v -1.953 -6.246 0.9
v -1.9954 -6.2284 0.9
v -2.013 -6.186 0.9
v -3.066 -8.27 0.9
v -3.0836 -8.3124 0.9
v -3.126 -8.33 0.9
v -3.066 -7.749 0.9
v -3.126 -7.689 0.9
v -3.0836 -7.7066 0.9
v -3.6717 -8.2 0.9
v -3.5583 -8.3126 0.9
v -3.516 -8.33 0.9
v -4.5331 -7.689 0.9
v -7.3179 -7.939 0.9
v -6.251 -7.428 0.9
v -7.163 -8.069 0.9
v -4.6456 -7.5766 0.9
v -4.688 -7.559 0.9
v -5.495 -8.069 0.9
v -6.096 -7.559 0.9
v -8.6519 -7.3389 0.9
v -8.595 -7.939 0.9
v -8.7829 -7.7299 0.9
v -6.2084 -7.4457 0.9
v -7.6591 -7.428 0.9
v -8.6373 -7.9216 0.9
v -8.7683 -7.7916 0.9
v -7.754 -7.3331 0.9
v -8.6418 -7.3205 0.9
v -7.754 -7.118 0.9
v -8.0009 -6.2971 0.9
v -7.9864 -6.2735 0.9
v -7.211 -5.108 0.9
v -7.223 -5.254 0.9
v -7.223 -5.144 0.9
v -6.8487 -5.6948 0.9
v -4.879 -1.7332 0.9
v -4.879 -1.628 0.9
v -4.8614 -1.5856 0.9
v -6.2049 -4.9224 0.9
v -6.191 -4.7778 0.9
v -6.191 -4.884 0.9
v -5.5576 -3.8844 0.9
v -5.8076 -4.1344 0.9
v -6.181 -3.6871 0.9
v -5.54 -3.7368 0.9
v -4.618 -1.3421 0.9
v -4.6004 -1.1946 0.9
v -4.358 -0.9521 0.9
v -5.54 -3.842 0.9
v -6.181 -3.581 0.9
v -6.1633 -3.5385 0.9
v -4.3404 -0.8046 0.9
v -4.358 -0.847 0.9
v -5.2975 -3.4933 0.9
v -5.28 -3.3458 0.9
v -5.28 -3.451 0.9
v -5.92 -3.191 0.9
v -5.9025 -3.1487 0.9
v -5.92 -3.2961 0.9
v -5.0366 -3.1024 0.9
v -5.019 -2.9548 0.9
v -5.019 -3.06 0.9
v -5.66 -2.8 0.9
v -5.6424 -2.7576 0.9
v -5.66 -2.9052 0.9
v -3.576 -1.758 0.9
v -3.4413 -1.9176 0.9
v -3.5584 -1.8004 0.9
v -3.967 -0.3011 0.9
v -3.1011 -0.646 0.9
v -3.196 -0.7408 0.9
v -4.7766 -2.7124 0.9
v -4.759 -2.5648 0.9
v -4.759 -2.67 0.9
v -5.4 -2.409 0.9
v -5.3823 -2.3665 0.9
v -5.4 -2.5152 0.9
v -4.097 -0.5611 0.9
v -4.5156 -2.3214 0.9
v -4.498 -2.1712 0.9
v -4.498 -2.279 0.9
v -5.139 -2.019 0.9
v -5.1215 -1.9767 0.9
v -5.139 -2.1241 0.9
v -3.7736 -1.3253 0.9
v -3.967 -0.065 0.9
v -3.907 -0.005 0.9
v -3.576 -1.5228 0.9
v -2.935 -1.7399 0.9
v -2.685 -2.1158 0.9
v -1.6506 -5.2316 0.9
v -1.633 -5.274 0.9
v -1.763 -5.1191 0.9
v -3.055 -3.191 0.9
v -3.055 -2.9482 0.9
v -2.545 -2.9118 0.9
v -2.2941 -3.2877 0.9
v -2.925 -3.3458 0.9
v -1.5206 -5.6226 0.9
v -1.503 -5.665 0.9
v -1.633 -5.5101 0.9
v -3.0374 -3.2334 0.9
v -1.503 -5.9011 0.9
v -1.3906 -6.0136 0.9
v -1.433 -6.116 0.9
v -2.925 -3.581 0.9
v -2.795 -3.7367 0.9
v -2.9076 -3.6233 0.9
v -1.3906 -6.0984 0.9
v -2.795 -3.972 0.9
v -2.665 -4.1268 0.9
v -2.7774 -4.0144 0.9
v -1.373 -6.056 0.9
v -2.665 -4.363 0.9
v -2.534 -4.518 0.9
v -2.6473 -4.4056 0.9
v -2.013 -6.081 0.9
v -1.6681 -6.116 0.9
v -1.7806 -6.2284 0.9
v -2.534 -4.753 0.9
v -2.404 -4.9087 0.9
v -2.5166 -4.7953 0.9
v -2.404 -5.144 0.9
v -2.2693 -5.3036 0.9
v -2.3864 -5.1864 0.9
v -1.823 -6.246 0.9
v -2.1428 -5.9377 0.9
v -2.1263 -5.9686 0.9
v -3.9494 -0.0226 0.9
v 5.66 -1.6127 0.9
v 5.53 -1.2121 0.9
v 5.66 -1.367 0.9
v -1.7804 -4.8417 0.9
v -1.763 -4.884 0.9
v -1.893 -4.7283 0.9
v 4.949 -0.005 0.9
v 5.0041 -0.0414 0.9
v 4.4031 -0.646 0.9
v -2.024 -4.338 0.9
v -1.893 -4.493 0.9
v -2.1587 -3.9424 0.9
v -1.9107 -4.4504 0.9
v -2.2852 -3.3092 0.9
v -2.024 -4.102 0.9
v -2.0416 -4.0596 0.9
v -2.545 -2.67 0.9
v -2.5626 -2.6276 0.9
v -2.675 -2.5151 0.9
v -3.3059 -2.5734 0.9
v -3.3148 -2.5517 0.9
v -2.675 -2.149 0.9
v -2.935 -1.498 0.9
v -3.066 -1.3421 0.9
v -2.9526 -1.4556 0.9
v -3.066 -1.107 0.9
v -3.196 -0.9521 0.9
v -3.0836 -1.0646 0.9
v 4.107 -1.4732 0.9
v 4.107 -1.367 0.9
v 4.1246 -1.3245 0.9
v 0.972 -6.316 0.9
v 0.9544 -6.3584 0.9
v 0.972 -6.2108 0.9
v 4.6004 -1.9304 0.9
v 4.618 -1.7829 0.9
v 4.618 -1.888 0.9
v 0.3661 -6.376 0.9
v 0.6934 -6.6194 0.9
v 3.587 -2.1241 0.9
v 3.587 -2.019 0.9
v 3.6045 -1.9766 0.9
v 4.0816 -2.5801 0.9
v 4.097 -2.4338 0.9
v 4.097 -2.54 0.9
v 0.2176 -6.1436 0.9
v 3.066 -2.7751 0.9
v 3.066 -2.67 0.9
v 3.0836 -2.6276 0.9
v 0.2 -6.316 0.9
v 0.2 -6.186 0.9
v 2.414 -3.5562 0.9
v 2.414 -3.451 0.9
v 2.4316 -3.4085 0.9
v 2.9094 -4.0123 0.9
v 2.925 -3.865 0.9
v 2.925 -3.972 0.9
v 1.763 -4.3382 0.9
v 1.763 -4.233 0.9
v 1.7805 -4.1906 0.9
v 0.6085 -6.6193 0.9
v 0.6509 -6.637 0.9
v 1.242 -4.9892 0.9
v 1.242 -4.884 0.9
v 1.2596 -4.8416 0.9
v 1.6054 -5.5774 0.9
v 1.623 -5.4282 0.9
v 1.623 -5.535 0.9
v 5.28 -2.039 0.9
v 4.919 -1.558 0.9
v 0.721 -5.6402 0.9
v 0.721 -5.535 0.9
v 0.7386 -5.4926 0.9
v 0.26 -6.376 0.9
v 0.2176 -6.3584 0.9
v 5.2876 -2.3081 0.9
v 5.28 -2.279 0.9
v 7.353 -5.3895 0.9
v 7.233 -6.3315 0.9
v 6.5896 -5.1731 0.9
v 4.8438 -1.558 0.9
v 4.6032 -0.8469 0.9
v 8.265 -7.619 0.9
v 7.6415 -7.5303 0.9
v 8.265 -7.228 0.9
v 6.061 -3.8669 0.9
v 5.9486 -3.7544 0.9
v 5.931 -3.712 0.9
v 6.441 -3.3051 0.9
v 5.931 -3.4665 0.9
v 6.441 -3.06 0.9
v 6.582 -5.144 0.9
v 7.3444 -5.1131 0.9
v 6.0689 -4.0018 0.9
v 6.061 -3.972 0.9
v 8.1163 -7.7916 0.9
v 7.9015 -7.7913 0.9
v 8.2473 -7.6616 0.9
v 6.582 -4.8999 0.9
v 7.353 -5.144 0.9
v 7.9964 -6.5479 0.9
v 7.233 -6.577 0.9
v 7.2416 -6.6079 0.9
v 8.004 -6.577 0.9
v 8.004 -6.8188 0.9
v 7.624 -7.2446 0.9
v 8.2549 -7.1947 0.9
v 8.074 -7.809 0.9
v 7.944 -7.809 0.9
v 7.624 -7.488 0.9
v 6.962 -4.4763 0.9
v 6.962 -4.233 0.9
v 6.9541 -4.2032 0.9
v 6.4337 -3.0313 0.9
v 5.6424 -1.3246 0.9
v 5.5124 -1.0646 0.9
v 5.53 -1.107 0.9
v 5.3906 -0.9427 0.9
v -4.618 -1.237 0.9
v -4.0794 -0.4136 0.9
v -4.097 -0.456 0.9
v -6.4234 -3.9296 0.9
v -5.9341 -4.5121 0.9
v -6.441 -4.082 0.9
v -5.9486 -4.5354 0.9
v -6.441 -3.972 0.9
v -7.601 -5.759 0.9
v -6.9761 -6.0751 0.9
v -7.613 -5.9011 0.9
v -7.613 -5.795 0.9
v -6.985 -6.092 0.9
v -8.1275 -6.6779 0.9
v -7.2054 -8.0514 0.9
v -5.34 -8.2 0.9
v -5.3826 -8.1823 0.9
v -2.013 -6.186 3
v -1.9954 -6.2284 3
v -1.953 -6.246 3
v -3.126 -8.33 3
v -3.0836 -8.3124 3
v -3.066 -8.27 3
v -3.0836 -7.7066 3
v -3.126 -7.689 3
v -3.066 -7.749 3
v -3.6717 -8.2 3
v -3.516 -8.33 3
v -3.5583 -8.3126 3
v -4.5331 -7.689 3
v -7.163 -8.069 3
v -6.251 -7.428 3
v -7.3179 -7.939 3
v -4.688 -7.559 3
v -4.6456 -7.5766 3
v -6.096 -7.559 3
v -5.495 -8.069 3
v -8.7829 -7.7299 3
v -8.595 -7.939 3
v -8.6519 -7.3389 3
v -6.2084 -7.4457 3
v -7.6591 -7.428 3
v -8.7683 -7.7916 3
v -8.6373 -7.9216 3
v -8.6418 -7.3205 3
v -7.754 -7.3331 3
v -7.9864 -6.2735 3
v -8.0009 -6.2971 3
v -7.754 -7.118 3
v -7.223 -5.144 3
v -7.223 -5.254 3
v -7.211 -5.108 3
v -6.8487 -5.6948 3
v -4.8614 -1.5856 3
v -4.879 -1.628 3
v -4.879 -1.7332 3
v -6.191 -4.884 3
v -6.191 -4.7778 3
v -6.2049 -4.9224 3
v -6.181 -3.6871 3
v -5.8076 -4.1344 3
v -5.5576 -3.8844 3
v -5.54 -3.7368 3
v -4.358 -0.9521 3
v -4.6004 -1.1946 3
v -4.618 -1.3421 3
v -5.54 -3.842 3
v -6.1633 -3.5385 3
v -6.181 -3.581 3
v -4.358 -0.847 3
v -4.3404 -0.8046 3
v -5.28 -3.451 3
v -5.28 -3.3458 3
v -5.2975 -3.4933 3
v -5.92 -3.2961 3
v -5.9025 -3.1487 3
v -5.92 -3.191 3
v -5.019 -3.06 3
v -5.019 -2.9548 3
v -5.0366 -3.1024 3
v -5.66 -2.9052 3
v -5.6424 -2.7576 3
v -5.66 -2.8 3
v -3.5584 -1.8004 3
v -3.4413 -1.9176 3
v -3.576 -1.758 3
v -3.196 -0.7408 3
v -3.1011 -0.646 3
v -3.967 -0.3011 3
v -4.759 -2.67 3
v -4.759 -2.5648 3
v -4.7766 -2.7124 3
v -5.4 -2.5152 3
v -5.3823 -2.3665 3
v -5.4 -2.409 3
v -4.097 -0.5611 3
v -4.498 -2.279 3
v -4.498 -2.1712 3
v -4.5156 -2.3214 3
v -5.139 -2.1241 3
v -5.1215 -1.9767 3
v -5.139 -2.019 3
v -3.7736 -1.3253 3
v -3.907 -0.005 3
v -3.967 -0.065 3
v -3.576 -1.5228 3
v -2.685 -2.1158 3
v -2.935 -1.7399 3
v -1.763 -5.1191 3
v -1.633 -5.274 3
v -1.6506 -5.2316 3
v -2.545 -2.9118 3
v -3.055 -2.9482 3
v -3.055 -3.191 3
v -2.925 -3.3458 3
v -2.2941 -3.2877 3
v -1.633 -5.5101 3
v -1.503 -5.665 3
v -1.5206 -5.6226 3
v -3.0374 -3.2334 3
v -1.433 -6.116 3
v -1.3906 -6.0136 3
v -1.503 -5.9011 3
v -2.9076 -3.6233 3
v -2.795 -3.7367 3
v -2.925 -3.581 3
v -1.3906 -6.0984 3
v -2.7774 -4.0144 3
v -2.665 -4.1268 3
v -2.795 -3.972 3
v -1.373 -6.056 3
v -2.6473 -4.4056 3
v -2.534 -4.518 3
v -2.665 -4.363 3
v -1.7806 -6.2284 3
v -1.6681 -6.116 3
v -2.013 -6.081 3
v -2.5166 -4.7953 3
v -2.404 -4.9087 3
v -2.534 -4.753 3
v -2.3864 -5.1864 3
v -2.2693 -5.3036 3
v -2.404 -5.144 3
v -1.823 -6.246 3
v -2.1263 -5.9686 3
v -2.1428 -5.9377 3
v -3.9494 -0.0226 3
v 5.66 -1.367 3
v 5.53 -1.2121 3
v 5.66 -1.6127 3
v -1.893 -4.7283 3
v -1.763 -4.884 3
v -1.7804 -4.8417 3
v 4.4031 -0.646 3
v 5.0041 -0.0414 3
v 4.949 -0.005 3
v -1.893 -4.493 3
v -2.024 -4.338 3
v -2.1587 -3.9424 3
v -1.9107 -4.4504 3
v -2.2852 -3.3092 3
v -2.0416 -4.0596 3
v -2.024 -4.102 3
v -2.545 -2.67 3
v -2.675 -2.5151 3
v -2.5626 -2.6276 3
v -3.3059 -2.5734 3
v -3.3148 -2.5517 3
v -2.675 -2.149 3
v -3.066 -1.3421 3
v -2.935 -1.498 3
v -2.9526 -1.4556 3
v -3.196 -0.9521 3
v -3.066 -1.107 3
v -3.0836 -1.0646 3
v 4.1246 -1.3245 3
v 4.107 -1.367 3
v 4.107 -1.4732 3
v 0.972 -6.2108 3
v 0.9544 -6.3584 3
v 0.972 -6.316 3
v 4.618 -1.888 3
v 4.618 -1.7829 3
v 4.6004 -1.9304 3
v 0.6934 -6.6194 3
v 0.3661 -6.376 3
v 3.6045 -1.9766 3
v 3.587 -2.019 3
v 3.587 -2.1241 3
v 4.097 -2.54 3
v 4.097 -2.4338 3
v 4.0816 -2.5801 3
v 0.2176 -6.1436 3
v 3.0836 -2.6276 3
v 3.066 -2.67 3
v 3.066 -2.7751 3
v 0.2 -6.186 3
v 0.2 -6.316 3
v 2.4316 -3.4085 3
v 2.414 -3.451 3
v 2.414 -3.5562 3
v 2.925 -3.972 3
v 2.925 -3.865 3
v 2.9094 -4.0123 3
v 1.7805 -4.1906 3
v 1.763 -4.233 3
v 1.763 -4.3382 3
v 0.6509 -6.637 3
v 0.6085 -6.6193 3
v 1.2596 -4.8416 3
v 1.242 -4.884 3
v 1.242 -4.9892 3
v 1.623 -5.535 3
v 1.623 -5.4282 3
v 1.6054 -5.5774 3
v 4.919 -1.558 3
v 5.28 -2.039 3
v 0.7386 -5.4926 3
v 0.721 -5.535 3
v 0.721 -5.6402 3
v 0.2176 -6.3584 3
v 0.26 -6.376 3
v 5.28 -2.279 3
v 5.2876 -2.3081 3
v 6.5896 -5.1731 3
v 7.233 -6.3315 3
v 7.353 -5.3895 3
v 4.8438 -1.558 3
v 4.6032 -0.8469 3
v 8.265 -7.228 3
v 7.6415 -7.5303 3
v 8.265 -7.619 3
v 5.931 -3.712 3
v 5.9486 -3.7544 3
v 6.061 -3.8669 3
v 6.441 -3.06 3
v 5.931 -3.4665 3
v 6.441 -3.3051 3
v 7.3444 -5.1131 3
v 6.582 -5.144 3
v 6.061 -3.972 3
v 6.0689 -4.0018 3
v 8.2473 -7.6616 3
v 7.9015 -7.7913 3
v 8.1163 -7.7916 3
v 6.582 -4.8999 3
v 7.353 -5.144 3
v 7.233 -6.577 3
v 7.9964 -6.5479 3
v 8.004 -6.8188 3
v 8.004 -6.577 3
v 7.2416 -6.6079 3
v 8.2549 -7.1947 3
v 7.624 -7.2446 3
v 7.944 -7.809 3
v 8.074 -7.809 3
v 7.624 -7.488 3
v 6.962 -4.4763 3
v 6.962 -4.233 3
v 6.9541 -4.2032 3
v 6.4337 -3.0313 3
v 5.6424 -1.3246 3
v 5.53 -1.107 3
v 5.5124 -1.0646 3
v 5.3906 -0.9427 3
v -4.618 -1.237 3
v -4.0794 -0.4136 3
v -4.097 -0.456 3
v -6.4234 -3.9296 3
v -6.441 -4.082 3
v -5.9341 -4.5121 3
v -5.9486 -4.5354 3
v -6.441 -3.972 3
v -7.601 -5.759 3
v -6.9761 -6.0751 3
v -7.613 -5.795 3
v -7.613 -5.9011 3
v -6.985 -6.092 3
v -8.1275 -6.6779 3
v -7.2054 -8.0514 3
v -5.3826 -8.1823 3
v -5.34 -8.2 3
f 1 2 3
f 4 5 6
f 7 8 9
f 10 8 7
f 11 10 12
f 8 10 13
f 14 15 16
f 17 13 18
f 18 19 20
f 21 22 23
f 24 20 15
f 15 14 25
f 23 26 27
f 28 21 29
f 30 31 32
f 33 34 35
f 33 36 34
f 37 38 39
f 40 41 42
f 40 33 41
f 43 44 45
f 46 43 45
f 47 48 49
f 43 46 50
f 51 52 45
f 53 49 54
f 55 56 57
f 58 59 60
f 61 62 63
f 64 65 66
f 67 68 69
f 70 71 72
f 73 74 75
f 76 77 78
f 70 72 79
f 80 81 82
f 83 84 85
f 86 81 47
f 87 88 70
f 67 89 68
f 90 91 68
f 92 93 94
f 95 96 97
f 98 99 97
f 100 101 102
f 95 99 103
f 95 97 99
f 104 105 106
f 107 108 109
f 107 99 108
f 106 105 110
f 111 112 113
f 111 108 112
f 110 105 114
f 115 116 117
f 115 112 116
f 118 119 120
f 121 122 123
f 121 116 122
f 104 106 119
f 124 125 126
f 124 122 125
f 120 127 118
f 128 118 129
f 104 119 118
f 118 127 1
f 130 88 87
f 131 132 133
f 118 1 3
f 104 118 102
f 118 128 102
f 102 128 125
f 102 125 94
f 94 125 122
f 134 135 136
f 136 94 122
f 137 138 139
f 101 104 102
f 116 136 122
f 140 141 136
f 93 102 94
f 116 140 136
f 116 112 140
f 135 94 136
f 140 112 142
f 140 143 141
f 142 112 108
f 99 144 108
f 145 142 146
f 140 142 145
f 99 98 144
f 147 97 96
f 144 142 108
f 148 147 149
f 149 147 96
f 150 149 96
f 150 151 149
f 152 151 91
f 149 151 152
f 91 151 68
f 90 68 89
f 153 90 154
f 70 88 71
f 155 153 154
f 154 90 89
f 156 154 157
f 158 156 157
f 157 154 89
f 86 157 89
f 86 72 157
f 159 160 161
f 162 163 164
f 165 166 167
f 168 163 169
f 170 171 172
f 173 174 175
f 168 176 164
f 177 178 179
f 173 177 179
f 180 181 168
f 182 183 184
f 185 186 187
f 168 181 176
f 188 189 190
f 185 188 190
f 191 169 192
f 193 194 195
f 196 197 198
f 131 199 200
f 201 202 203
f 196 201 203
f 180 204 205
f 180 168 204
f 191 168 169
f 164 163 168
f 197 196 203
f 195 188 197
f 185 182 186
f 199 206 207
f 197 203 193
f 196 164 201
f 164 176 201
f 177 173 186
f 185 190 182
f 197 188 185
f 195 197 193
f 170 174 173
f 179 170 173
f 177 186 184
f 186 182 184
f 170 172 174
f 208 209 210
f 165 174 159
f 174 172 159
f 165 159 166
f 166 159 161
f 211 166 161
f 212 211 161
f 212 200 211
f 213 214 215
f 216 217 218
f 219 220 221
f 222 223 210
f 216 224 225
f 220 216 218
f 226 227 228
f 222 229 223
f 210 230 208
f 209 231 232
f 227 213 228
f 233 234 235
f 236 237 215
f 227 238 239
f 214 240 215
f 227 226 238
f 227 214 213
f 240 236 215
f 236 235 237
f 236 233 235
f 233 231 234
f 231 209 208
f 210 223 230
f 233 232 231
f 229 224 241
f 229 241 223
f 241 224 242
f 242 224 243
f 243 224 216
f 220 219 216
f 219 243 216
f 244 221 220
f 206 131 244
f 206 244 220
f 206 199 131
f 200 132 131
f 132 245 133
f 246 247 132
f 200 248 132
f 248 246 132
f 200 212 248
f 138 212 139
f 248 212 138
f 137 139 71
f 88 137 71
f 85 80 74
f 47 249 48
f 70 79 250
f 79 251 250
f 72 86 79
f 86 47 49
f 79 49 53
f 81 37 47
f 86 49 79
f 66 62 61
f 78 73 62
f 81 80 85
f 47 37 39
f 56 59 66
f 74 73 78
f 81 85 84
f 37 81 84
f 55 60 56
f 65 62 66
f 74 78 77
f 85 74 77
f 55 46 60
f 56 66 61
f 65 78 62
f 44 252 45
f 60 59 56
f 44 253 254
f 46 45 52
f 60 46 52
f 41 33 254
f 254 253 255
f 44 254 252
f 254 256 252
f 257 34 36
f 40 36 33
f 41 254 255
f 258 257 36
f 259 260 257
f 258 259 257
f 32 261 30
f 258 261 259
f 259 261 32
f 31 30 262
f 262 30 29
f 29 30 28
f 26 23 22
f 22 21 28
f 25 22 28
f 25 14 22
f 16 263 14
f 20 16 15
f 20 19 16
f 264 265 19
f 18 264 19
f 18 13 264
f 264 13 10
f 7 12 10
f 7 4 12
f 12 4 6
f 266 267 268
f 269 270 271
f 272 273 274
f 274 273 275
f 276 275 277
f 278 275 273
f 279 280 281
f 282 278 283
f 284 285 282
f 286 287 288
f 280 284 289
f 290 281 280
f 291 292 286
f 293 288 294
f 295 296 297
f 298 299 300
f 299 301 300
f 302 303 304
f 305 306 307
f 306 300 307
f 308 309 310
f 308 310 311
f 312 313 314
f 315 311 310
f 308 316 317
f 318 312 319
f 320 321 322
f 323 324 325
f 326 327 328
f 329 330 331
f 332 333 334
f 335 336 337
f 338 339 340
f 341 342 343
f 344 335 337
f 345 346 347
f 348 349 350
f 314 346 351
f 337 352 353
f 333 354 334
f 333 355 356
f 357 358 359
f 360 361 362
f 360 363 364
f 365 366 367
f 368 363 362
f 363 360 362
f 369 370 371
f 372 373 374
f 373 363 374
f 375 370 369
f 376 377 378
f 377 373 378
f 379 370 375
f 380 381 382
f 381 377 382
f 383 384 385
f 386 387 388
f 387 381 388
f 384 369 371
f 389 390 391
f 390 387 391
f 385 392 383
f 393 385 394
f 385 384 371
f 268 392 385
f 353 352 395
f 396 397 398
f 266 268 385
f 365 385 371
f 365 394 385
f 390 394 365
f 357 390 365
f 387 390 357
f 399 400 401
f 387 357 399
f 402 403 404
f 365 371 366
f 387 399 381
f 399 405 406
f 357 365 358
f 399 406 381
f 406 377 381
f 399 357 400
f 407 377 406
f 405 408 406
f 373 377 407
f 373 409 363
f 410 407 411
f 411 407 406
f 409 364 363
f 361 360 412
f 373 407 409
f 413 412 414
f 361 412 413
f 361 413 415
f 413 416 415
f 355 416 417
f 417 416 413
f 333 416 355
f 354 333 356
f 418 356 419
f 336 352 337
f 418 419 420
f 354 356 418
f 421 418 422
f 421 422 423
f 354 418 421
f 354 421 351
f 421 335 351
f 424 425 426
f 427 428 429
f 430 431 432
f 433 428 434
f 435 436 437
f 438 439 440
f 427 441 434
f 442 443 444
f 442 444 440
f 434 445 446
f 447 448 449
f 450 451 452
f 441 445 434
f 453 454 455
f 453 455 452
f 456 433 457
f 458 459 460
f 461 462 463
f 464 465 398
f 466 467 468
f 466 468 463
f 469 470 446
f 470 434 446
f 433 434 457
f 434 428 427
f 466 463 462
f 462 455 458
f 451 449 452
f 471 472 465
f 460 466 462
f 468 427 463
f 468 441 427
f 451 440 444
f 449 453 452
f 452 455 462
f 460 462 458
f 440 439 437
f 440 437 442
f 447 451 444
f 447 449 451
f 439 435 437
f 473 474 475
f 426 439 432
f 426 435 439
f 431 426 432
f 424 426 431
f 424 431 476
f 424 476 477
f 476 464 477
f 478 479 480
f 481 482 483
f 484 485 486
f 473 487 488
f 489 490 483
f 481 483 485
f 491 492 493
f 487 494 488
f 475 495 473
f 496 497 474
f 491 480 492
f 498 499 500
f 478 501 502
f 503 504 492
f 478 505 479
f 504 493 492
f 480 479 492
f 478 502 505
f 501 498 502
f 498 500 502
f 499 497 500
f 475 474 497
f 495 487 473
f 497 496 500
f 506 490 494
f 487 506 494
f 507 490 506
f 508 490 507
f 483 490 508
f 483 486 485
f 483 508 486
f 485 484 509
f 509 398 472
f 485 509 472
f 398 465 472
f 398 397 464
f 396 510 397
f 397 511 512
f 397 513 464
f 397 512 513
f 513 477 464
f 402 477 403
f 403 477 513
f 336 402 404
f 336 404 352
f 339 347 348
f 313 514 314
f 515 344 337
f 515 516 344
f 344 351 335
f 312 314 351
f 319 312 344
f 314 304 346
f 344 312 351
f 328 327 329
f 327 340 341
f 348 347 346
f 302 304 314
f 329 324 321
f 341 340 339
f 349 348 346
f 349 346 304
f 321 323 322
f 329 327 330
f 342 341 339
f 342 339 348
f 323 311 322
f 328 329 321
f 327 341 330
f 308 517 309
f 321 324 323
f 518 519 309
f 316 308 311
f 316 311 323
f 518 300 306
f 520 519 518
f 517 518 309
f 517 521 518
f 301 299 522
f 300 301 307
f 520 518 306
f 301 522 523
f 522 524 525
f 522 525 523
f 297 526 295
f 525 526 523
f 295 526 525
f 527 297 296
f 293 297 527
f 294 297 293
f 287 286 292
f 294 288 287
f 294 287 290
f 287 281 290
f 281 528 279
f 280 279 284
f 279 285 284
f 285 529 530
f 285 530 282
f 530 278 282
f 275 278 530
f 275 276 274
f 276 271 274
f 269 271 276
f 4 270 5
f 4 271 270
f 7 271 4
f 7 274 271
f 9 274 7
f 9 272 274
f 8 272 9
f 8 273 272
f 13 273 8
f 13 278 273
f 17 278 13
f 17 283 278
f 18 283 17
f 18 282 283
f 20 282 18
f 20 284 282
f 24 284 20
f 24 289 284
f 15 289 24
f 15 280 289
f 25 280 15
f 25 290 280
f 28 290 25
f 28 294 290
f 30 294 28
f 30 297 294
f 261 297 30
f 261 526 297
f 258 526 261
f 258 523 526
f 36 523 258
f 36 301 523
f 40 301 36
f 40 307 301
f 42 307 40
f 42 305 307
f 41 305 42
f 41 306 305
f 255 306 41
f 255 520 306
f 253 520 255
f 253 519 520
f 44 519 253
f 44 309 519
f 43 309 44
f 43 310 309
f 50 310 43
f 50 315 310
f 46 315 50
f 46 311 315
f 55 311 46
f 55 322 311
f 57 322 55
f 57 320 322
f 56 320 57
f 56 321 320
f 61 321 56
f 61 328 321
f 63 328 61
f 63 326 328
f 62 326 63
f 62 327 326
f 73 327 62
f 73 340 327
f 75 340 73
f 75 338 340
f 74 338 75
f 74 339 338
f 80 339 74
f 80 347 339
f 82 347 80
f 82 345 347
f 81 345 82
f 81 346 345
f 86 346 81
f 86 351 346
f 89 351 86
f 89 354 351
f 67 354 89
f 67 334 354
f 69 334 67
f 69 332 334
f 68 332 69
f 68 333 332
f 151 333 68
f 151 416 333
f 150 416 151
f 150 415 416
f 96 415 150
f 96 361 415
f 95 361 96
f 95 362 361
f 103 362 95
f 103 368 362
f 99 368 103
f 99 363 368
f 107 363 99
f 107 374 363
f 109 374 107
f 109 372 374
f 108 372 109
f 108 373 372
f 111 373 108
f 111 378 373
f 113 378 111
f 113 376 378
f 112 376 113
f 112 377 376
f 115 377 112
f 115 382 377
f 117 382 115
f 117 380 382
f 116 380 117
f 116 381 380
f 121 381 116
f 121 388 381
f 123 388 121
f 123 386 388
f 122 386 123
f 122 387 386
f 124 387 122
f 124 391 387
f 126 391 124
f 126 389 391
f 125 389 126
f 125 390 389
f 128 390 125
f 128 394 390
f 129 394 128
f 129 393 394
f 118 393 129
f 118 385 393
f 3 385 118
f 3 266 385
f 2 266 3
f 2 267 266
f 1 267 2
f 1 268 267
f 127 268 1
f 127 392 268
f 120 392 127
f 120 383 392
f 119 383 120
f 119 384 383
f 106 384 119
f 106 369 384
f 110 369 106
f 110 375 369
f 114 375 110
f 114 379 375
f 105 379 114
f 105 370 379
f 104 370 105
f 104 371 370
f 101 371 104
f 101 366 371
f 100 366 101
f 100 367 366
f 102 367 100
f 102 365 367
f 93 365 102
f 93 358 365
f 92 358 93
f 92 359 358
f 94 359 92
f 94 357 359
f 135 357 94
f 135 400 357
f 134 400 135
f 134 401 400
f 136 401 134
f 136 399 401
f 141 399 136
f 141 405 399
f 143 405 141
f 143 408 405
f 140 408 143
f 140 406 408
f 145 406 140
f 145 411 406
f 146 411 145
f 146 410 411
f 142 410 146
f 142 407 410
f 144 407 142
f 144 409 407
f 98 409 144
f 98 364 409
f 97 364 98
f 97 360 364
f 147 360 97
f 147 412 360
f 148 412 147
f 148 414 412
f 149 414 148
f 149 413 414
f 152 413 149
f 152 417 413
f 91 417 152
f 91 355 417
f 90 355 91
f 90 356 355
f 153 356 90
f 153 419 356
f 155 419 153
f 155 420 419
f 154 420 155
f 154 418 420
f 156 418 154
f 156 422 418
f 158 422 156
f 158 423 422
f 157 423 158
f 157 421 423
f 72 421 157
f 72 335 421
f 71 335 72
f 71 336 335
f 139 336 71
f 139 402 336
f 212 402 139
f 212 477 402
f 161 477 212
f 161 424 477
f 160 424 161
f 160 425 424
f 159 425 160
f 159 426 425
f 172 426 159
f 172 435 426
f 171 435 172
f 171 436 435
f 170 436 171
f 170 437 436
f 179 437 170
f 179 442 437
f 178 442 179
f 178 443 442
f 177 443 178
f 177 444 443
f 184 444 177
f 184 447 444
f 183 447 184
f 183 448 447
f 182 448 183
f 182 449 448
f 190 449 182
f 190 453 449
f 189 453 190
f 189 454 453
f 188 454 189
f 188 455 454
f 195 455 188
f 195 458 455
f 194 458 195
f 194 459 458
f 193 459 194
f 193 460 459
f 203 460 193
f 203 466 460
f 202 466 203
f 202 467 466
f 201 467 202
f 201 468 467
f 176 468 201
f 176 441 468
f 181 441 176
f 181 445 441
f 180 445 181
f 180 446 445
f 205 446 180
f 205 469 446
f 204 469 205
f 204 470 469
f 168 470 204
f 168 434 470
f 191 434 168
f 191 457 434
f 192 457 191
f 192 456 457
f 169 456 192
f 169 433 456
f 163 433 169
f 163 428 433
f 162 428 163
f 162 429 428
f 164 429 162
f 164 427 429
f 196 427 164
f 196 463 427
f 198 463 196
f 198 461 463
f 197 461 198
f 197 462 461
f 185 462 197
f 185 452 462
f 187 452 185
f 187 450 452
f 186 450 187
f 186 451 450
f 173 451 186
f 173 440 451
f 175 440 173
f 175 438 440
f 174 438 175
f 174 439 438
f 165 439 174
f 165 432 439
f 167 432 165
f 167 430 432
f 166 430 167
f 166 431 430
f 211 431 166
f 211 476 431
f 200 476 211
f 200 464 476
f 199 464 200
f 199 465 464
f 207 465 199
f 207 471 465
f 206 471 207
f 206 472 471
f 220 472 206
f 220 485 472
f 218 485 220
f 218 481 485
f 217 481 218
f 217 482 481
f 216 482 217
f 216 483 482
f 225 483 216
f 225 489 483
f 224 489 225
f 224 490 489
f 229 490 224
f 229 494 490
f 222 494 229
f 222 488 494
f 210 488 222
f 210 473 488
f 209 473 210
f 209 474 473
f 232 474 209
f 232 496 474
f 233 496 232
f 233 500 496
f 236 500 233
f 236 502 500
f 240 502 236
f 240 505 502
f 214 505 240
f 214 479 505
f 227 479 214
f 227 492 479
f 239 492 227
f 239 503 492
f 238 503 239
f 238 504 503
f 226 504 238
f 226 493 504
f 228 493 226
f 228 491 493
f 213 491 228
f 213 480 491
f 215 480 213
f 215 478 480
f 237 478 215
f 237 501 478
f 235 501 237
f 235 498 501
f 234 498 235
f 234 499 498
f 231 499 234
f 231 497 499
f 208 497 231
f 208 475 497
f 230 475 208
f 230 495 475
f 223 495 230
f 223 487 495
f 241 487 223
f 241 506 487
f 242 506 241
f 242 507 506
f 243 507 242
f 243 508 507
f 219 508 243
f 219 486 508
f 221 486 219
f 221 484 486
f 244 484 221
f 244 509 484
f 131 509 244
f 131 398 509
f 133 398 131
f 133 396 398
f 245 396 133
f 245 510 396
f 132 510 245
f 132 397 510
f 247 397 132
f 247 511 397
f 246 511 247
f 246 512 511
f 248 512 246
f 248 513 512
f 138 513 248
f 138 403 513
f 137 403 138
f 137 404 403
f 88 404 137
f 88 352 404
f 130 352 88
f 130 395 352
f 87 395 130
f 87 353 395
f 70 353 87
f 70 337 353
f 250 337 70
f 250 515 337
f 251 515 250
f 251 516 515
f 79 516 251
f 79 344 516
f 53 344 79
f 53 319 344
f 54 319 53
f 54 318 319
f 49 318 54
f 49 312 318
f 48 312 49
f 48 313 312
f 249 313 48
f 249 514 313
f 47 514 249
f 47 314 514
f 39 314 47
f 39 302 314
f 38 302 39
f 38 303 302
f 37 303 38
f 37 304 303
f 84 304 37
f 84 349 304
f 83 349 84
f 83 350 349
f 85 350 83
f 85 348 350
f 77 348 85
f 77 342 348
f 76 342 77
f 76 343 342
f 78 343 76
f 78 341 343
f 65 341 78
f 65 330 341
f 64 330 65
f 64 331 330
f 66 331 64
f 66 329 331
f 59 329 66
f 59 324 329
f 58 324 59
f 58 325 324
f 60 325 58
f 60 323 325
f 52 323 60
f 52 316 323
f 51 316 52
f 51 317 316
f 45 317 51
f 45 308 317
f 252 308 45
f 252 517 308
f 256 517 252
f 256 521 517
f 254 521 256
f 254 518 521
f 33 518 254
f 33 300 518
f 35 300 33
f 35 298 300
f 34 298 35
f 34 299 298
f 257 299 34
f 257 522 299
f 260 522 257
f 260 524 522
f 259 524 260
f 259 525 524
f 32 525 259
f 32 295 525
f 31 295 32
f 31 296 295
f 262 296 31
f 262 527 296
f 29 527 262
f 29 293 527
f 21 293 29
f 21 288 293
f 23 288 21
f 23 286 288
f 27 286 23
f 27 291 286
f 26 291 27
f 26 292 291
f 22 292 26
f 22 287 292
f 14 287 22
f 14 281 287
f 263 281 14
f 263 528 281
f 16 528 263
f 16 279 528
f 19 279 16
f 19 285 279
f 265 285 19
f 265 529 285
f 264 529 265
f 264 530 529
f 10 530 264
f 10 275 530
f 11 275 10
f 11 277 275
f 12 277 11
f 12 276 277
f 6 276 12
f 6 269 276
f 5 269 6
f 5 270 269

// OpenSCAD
$fn = 24;
translate([0, 0.000, 0.900])
  linear_extrude(height=2.100) {
offset(r=0.06, $fn=8) {
    polygon(points=[[-8.726,-7.749],[-8.595,-7.879],[-7.293,-7.879],[-7.163,-8.009],[-5.470,-8.009],[-5.340,-8.140],[-3.647,-8.140],[-3.516,-8.270],[-3.126,-8.270],[-3.126,-7.749],[-4.558,-7.749],[-4.688,-7.619],[-6.121,-7.619],[-6.251,-7.488],[-7.684,-7.488],[-7.814,-7.358],[-7.814,-7.098],[-7.033,-6.056],[-6.902,-5.665],[-6.251,-4.884],[-6.251,-4.753],[-5.991,-4.493],[-5.860,-4.102],[-5.600,-3.842],[-5.600,-3.712],[-5.340,-3.451],[-5.340,-3.321],[-5.079,-3.060],[-5.079,-2.930],[-4.819,-2.670],[-4.819,-2.540],[-4.558,-2.279],[-4.558,-2.149],[-3.777,-1.237],[-3.516,-1.498],[-3.516,-1.758],[-3.386,-1.888],[-3.256,-2.540],[-2.995,-2.930],[-2.995,-3.191],[-2.865,-3.321],[-2.865,-3.581],[-2.735,-3.712],[-2.735,-3.972],[-2.605,-4.102],[-2.605,-4.363],[-2.474,-4.493],[-2.474,-4.753],[-2.344,-4.884],[-2.344,-5.144],[-2.214,-5.274],[-2.084,-5.926],[-1.953,-6.056],[-1.953,-6.186],[-1.823,-6.186],[-1.693,-6.056],[-1.433,-6.056],[-1.563,-5.926],[-1.563,-5.665],[-1.693,-5.535],[-1.693,-5.274],[-1.823,-5.144],[-1.823,-4.884],[-1.953,-4.753],[-1.953,-4.493],[-2.084,-4.363],[-2.084,-4.102],[-2.214,-3.972],[-2.344,-3.321],[-2.605,-2.930],[-2.605,-2.670],[-2.735,-2.540],[-2.735,-2.149],[-2.995,-1.758],[-2.995,-1.498],[-3.126,-1.367],[-3.126,-1.107],[-3.256,-0.977],[-3.256,-0.716],[-3.126,-0.586],[4.428,-0.586],[4.688,-0.847],[4.167,-1.367],[4.167,-1.498],[3.647,-2.019],[3.647,-2.149],[3.126,-2.670],[3.126,-2.800],[2.474,-3.451],[2.474,-3.581],[1.823,-4.233],[1.823,-4.363],[1.302,-4.884],[1.302,-5.014],[0.781,-5.535],[0.781,-5.665],[0.260,-6.186],[0.260,-6.316],[0.391,-6.316],[0.651,-6.577],[0.912,-6.316],[0.912,-6.186],[1.563,-5.535],[1.563,-5.405],[2.865,-3.972],[2.865,-3.842],[4.037,-2.540],[4.037,-2.409],[4.558,-1.888],[4.558,-1.758],[4.819,-1.498],[4.949,-1.498],[5.340,-2.019],[5.340,-2.279],[5.991,-3.451],[5.991,-3.712],[6.121,-3.842],[6.121,-3.972],[6.642,-4.884],[6.642,-5.144],[7.293,-6.316],[7.293,-6.577],[7.684,-7.228],[7.684,-7.488],[7.944,-7.749],[8.074,-7.749],[8.205,-7.619],[8.205,-7.228],[7.944,-6.837],[7.944,-6.577],[7.293,-5.405],[7.293,-5.144],[6.902,-4.493],[6.902,-4.233],[6.381,-3.321],[6.381,-3.060],[5.600,-1.628],[5.600,-1.367],[5.470,-1.237],[5.470,-1.107],[5.340,-0.977],[4.949,-0.065],[-3.907,-0.065],[-3.907,-0.326],[-4.037,-0.456],[-4.037,-0.586],[-4.298,-0.847],[-4.298,-0.977],[-4.558,-1.237],[-4.558,-1.367],[-4.819,-1.628],[-4.819,-1.758],[-5.079,-2.019],[-5.079,-2.149],[-5.340,-2.409],[-5.340,-2.540],[-5.600,-2.800],[-5.600,-2.930],[-5.860,-3.191],[-5.860,-3.321],[-6.121,-3.581],[-6.121,-3.712],[-6.381,-3.972],[-6.381,-4.102],[-7.163,-5.144],[-7.163,-5.274],[-7.553,-5.795],[-7.553,-5.926],[-7.944,-6.316],[-8.074,-6.707],[-8.595,-7.358]], paths=[[0,1,2,3,4,5,6,7,8,9,10,11,12,13,14,15,16,17,18,19,20,21,22,23,24,25,26,27,28,29,30,31,32,33,34,35,36,37,38,39,40,41,42,43,44,45,46,47,48,49,50,51,52,53,54,55,56,57,58,59,60,61,62,63,64,65,66,67,68,69,70,71,72,73,74,75,76,77,78,79,80,81,82,83,84,85,86,87,88,89,90,91,92,93,94,95,96,97,98,99,100,101,102,103,104,105,106,107,108,109,110,111,112,113,114,115,116,117,118,119,120,121,122,123,124,125,126,127,128,129,130,131,132,133,134,135,136,137,138,139,140,141,142,143,144,145,146,147,148,149,150,151,152,153,154,155,156,157,158,159,160,161,162,163,164,165,166,167,168,169,170]]);
}
}
